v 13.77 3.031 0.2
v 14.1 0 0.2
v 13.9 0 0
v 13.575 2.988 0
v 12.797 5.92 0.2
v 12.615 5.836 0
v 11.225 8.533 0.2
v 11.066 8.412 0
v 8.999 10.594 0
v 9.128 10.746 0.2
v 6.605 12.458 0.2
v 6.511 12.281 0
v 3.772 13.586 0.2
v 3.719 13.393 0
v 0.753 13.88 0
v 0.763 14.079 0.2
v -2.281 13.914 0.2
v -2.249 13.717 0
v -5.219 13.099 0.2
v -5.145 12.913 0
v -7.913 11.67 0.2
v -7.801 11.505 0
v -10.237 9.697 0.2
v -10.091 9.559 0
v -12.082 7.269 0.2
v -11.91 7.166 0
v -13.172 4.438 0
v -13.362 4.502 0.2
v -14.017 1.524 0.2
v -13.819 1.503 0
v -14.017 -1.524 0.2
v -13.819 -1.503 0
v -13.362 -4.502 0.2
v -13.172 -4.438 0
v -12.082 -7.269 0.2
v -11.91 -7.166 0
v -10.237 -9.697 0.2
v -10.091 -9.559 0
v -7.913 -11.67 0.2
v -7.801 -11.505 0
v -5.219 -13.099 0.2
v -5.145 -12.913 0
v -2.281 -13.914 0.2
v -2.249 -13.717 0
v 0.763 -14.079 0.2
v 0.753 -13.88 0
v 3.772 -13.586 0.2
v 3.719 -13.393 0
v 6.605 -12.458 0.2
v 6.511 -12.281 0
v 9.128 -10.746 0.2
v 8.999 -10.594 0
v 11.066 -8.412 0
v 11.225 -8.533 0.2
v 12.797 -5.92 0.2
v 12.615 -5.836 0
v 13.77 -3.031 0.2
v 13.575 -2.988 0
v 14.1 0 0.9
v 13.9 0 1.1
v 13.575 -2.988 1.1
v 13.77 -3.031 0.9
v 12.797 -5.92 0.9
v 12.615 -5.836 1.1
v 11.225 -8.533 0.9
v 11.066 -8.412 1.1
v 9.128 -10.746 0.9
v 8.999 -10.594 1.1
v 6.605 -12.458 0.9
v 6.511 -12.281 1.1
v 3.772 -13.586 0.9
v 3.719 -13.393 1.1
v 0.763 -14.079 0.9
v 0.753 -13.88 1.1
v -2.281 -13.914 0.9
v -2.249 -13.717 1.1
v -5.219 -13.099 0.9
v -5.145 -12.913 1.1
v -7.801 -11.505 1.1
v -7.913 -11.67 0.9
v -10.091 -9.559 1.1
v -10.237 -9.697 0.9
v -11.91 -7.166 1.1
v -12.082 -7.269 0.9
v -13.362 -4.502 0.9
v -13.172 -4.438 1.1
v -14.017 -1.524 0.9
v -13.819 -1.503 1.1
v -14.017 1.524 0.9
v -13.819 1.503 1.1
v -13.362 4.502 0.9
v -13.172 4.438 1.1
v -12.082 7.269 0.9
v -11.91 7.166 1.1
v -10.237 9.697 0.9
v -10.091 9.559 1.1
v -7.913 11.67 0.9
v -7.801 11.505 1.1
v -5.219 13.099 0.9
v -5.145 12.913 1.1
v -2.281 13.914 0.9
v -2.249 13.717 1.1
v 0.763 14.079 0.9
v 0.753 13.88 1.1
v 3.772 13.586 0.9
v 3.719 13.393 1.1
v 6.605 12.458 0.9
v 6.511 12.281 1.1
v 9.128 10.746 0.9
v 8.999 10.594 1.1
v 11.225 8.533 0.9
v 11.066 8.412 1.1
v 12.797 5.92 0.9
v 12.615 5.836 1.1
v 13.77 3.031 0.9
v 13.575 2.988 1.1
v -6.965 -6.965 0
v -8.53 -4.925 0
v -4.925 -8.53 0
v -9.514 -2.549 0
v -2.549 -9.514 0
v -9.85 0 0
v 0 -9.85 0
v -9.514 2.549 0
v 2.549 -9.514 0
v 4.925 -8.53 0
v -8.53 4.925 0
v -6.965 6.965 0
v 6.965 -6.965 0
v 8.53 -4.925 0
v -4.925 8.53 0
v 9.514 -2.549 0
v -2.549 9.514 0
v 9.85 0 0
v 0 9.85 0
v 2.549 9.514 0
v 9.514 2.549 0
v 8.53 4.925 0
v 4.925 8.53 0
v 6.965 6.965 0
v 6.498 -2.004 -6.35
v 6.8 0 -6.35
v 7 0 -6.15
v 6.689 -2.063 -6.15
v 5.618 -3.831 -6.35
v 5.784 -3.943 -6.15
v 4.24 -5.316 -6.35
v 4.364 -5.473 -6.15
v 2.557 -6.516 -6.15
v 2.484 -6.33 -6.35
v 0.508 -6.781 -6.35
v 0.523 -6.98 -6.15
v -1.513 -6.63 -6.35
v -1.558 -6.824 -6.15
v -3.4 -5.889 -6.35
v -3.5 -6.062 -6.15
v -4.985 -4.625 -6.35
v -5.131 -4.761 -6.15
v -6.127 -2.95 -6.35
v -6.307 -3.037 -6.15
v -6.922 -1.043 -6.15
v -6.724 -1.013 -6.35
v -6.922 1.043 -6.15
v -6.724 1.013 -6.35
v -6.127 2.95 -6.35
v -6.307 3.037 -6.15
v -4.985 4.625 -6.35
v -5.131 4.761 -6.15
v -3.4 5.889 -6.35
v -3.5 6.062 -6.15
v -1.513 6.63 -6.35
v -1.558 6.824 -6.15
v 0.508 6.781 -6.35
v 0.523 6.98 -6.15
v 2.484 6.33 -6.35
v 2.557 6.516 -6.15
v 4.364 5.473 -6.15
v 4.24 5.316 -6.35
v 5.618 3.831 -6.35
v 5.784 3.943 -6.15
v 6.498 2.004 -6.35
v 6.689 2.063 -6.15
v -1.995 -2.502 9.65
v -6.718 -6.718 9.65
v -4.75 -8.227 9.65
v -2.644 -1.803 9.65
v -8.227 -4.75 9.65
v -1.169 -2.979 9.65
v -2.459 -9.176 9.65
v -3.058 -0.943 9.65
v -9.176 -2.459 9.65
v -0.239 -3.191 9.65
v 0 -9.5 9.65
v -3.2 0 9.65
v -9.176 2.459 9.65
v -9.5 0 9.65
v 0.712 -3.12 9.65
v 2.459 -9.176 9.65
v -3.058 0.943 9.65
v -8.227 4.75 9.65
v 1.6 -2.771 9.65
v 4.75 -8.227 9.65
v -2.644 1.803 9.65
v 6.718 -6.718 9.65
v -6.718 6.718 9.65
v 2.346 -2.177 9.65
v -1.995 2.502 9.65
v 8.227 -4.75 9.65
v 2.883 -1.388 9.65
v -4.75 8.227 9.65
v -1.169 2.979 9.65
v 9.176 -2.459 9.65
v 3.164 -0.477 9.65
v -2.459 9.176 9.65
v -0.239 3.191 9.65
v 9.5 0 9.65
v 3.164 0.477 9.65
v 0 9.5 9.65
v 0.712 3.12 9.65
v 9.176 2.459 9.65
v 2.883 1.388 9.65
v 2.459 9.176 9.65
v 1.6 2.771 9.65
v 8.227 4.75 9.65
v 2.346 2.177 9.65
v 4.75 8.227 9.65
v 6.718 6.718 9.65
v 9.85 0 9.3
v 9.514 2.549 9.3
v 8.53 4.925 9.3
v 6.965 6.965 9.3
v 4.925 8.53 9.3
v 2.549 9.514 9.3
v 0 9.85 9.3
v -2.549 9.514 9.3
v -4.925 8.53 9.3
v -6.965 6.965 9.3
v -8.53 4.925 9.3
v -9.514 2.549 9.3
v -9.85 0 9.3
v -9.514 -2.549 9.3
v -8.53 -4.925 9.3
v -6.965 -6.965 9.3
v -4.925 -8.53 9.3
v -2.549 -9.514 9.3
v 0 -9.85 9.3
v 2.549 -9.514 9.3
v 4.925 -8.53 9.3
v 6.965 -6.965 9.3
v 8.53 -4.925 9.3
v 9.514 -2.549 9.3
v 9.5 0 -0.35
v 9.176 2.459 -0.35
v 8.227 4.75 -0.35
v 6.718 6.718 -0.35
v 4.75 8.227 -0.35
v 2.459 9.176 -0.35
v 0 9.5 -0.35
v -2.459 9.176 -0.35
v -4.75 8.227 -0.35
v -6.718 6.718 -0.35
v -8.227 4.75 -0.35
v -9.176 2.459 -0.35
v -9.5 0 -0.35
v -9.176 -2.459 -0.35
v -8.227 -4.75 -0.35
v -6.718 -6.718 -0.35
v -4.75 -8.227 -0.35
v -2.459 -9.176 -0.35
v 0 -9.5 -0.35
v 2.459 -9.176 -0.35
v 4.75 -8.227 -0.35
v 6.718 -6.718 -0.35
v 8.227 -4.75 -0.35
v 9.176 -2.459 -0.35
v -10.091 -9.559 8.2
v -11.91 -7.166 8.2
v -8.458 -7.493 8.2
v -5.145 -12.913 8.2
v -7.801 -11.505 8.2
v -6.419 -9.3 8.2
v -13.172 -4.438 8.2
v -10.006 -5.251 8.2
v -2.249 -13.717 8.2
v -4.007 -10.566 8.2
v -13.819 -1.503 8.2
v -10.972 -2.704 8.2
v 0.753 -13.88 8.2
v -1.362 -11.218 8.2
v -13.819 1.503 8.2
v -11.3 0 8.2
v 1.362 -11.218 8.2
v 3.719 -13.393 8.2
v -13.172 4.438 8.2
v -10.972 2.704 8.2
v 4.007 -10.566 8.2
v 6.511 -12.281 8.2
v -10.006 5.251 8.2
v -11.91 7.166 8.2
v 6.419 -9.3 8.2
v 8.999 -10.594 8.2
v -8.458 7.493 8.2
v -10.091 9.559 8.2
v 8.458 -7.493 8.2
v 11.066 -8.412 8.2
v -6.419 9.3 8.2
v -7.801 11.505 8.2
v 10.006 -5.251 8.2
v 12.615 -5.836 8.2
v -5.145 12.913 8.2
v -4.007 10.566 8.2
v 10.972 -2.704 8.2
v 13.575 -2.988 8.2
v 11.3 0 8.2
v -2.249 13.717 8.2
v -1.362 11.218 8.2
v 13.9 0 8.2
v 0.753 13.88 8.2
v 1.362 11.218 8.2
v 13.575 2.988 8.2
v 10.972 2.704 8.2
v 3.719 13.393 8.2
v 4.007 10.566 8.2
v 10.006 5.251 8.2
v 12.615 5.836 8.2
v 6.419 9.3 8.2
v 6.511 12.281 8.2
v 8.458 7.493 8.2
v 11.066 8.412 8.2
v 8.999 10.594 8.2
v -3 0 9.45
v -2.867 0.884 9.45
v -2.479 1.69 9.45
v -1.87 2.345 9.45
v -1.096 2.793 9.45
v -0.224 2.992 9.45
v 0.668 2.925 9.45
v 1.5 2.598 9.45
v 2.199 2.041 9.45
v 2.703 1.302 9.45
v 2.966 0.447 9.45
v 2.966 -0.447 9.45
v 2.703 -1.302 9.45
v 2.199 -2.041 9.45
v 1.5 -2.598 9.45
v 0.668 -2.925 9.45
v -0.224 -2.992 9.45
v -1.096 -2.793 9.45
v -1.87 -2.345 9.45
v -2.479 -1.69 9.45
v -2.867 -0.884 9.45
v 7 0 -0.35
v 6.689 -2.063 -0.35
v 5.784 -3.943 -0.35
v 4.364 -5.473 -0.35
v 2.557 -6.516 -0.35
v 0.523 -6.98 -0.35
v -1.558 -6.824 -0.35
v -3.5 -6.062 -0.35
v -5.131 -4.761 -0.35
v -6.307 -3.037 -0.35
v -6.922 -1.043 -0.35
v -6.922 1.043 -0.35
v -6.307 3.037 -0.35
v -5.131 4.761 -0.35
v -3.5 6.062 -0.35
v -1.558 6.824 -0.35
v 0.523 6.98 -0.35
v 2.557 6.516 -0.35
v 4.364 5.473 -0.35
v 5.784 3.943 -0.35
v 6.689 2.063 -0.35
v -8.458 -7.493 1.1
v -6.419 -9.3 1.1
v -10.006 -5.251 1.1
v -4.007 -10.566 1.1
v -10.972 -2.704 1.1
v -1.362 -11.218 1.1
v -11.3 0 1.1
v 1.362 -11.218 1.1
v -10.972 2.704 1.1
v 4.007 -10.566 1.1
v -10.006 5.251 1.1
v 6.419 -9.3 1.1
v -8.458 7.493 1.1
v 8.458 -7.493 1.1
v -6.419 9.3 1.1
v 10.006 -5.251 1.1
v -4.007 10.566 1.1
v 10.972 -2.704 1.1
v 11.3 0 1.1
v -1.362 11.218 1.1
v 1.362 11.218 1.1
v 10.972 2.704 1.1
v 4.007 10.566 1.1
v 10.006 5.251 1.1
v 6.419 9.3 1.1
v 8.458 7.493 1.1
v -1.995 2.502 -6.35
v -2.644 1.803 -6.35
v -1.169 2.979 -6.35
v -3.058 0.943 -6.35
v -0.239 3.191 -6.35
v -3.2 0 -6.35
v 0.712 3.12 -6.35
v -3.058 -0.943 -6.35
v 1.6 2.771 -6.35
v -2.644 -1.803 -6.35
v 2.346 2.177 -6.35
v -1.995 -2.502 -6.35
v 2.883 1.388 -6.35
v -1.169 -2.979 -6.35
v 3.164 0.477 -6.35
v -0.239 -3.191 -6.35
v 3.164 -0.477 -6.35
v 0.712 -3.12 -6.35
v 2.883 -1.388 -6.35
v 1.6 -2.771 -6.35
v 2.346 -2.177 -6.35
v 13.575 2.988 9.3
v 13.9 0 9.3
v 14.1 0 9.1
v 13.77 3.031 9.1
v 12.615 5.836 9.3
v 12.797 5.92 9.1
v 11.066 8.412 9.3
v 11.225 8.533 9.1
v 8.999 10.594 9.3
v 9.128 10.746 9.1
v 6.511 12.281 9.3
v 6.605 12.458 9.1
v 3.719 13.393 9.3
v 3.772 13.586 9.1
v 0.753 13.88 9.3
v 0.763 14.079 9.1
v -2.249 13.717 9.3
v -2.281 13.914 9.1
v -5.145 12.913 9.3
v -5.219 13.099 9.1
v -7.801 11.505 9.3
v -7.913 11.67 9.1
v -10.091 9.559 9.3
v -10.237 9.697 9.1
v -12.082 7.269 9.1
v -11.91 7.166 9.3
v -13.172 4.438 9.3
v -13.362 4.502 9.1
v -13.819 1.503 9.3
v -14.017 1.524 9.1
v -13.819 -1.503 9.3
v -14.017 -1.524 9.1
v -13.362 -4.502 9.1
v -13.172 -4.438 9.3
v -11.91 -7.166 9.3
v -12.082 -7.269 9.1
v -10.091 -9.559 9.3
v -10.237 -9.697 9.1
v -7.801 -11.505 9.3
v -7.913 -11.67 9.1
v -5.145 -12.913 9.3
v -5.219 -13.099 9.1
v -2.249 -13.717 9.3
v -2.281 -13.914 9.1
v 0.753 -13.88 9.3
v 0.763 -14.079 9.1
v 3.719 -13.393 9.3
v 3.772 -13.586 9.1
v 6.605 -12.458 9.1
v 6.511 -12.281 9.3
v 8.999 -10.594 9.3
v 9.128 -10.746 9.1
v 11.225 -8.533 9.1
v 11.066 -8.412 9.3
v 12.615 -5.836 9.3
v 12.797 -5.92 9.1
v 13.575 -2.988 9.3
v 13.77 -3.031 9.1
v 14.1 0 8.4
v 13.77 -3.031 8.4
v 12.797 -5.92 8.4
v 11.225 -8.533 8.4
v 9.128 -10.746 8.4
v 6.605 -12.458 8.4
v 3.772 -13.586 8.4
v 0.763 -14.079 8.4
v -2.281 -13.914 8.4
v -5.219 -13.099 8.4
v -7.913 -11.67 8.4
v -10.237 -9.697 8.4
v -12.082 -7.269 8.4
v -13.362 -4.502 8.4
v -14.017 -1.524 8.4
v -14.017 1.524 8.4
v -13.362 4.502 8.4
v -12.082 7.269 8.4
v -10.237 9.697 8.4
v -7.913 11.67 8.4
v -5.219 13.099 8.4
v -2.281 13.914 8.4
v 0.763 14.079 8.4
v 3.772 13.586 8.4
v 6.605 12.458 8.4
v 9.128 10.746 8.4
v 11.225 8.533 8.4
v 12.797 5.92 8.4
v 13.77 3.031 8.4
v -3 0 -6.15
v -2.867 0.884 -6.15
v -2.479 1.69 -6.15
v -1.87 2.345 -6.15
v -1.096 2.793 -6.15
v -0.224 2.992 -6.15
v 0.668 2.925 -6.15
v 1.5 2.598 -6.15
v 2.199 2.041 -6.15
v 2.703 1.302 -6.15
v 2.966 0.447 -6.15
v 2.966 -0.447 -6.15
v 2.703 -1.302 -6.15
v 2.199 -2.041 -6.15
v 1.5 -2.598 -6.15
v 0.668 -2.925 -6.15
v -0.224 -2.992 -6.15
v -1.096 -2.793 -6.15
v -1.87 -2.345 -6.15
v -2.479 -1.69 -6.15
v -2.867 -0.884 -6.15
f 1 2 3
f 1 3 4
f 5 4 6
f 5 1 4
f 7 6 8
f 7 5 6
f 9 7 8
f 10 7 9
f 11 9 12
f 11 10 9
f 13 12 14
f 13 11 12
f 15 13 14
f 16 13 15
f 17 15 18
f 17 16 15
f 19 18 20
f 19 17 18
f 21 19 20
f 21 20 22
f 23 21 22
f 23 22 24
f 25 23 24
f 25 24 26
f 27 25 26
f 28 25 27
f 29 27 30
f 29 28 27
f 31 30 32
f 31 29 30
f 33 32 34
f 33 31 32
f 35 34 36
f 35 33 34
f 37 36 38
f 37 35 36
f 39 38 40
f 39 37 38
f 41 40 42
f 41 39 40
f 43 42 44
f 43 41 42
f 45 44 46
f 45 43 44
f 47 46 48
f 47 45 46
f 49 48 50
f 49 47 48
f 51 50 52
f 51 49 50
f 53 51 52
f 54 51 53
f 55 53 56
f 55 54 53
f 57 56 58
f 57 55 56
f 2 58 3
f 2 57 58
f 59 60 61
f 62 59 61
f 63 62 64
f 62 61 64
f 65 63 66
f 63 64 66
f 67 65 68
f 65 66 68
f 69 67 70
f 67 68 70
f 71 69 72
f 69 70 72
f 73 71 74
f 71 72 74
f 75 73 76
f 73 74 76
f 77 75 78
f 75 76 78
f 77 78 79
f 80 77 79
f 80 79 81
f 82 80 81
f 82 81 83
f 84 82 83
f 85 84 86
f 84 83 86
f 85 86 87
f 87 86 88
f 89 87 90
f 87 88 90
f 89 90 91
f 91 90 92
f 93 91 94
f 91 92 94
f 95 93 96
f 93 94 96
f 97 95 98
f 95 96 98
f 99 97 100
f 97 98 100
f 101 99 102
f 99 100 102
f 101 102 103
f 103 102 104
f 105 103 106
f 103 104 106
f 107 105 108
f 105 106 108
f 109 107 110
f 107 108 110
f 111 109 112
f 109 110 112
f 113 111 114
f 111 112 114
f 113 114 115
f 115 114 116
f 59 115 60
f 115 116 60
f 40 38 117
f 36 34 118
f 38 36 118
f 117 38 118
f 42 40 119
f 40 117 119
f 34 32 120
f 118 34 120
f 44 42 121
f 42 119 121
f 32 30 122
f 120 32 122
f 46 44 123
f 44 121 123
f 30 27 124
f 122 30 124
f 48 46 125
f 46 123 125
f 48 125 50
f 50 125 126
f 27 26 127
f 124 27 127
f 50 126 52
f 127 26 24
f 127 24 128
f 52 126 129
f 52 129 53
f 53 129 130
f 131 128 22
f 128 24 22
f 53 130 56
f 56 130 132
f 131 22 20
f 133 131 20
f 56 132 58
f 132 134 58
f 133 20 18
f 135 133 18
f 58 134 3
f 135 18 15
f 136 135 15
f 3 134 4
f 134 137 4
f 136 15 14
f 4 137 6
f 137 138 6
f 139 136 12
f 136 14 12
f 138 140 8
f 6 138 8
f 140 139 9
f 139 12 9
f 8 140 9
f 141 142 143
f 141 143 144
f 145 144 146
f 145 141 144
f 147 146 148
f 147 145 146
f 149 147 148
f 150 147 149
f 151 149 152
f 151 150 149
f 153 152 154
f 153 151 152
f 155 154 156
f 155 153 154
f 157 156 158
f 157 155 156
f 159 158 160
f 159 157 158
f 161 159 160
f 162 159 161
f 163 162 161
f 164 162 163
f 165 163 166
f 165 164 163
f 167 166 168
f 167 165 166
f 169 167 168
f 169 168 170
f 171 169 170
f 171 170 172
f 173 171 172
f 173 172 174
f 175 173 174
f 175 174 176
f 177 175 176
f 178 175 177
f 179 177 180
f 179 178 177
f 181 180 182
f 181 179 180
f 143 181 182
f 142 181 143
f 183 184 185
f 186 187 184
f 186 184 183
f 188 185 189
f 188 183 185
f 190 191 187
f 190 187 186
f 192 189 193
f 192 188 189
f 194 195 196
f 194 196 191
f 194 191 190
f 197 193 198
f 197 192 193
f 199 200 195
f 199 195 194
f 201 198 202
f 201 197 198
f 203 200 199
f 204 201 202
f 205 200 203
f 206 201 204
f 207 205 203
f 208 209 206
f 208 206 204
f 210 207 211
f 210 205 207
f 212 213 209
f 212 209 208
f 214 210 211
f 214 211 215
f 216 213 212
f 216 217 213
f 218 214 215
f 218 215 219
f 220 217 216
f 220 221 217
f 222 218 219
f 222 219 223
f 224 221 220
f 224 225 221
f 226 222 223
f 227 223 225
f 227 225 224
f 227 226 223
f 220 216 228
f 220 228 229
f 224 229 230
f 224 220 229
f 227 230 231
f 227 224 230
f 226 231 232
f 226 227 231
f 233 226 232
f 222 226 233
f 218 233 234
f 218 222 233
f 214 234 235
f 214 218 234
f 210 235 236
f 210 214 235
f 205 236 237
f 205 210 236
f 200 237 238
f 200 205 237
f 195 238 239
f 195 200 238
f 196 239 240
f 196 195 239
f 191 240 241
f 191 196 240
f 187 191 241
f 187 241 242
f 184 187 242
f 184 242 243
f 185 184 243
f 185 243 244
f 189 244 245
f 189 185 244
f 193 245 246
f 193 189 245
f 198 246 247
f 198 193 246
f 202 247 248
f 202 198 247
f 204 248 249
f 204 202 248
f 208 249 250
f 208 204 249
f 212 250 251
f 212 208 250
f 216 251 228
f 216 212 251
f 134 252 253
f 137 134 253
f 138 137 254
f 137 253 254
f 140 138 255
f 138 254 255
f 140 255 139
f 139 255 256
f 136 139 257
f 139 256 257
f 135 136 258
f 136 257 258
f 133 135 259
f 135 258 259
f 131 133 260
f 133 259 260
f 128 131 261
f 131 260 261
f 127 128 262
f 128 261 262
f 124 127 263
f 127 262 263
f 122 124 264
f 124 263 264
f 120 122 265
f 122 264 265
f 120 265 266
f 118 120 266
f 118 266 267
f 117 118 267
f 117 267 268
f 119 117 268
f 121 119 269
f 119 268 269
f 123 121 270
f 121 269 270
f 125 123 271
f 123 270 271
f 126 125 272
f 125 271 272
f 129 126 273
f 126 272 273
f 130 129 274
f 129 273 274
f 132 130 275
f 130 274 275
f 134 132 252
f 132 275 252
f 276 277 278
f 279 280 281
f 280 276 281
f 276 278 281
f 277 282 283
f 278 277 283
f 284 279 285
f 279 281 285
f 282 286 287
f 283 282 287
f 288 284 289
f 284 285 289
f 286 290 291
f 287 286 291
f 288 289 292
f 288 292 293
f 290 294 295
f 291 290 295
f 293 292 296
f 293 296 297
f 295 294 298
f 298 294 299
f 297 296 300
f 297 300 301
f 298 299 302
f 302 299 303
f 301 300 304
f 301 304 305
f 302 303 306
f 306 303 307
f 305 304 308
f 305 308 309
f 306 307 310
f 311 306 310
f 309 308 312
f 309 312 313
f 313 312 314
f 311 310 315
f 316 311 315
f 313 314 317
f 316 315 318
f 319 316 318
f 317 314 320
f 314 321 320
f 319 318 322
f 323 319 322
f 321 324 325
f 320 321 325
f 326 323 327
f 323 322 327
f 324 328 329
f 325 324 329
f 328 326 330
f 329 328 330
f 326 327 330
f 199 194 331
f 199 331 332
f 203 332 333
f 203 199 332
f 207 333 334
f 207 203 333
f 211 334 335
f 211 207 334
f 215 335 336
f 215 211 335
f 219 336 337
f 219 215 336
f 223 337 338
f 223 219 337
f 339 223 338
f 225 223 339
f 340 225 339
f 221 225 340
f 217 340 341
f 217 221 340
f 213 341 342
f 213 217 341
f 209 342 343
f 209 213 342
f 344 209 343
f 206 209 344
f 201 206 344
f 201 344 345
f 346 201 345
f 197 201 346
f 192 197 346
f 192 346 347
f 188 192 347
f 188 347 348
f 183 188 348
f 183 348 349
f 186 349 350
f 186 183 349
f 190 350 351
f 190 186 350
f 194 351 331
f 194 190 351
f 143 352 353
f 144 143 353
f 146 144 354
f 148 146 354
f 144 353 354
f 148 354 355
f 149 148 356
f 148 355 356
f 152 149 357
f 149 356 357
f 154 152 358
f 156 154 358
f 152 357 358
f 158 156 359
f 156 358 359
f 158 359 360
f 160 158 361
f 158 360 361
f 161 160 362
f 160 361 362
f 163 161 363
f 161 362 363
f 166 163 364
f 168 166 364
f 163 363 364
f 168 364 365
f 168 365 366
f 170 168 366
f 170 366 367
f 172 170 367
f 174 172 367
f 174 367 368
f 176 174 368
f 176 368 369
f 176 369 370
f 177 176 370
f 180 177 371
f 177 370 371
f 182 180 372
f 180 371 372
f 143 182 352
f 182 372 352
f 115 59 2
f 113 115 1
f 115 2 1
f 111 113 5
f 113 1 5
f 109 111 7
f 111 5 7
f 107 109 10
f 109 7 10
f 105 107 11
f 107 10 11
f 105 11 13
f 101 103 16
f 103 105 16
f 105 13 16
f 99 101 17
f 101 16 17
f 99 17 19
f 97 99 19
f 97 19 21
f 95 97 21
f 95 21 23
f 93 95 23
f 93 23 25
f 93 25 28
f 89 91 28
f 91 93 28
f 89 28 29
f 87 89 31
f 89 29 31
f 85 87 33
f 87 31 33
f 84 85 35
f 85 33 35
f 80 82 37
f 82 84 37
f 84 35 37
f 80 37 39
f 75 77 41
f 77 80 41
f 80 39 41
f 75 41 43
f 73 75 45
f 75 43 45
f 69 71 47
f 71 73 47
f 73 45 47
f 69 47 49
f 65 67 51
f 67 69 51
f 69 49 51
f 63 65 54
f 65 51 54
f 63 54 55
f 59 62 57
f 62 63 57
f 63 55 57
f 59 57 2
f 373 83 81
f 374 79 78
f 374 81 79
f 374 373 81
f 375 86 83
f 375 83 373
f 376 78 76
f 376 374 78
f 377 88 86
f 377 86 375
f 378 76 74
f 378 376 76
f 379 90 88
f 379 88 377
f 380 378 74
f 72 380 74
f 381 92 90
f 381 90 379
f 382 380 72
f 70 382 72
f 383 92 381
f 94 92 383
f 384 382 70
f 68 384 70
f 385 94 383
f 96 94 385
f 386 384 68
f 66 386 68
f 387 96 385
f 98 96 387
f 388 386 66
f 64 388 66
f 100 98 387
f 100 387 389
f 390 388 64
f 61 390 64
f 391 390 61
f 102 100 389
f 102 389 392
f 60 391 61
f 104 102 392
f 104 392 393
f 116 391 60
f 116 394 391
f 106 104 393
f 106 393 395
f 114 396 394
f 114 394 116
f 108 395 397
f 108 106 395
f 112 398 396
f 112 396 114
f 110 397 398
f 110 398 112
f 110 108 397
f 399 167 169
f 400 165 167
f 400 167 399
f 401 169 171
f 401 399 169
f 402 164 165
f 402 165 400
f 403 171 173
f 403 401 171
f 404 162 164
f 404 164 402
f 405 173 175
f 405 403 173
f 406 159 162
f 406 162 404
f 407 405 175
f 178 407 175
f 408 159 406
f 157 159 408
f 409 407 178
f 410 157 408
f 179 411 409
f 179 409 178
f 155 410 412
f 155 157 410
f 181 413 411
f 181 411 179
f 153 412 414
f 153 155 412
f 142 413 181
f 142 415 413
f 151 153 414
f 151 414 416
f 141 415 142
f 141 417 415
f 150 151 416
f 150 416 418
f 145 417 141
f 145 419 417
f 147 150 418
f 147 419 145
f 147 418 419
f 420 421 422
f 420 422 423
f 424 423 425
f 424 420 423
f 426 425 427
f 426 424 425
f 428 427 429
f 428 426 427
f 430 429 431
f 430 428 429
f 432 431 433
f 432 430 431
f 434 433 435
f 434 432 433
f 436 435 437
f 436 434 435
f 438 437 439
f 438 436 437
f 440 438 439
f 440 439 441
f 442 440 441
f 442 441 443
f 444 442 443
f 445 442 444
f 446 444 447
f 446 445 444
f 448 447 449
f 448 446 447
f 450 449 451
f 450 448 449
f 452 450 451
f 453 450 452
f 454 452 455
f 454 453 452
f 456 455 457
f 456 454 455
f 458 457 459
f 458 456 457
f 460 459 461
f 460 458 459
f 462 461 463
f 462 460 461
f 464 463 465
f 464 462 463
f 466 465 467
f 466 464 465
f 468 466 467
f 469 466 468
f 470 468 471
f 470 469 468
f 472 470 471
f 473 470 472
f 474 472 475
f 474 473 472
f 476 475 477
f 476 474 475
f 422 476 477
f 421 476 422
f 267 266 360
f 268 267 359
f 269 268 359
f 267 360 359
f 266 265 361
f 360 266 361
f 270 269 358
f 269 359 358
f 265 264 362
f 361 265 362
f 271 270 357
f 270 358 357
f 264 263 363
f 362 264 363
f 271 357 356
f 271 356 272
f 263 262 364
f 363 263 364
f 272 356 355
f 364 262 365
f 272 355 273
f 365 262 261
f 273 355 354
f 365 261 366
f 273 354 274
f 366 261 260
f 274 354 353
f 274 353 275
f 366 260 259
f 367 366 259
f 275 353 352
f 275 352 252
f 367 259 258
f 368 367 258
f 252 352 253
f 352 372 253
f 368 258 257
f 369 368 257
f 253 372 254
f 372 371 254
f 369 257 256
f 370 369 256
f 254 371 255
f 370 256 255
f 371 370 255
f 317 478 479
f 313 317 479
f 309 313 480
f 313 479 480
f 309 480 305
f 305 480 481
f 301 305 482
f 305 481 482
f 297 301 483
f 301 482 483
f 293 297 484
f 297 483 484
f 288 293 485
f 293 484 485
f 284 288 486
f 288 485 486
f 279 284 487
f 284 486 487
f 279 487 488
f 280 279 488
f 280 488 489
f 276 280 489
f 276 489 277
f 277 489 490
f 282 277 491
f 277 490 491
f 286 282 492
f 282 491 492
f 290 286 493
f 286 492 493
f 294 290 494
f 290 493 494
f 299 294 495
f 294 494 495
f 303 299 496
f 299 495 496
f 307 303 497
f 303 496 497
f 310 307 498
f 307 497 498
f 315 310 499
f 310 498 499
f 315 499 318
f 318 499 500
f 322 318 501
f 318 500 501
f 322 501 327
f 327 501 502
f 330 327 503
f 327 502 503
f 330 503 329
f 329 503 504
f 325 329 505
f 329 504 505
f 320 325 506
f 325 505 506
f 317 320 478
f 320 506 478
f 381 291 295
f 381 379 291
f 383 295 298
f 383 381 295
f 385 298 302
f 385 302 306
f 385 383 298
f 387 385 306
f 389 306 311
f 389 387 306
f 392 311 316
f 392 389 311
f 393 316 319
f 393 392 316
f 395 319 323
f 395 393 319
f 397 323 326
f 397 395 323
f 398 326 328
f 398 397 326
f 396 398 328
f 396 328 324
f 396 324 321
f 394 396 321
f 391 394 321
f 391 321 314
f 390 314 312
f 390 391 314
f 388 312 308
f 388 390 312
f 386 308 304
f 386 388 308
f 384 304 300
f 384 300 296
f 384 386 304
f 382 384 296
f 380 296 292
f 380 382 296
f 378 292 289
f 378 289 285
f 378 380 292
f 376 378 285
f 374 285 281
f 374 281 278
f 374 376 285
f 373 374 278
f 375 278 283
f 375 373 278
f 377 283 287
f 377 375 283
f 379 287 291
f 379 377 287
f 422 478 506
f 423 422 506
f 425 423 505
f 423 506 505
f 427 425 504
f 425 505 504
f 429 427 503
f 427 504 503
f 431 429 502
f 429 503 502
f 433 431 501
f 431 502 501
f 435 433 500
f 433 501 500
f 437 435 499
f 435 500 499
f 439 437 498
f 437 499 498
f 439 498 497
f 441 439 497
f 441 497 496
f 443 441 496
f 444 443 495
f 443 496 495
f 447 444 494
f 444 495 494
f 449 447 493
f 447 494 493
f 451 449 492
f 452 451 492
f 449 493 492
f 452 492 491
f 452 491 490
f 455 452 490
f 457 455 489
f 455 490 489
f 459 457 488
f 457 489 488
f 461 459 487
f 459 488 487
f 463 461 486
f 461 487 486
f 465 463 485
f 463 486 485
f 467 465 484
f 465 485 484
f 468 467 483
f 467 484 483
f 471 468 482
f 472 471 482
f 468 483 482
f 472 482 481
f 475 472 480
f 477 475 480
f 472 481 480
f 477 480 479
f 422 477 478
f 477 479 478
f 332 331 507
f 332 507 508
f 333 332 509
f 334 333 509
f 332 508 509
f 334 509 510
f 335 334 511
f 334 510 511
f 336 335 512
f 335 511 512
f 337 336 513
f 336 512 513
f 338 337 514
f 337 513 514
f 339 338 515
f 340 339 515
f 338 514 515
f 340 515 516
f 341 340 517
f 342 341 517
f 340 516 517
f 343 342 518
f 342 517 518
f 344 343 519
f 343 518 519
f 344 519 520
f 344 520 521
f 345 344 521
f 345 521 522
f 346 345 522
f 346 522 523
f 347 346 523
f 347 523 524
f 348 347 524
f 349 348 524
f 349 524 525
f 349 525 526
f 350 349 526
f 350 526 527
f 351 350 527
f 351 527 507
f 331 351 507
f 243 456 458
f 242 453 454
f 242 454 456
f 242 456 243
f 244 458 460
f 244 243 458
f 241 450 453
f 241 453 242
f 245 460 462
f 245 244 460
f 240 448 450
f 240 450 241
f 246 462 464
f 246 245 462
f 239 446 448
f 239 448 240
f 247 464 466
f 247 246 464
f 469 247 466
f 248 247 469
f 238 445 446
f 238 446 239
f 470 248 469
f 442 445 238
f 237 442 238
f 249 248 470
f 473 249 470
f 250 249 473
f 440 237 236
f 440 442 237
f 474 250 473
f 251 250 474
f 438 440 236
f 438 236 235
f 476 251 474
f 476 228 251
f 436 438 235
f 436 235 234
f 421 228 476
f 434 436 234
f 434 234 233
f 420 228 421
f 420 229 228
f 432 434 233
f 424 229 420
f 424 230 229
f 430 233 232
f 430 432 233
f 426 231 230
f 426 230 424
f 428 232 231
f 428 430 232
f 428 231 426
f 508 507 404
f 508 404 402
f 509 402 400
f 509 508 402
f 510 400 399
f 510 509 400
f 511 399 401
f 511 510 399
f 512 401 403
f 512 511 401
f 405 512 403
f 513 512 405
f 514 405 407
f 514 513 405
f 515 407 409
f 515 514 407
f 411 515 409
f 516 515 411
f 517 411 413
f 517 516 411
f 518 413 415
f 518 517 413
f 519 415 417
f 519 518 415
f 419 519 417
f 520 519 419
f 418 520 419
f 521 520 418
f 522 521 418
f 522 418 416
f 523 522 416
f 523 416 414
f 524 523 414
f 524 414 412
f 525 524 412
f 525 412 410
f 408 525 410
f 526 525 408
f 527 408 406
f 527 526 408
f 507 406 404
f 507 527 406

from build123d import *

# Parameters (mm, degrees)
SKETCH1_R                = 14.1
BOSS_EXTRUDE1_DEPTH      = 9.3
SKETCH2_W                = 7.1
SKETCH2_H                = 2.8
BOSS_EXTRUDE2_DEPTH      = 0.35
BOSS_EXTRUDE2_DEPTH_BACK = 9.65
SKETCH3_R                = 9.85
CHAMFER1_SIZE            = 0.35
SKETCH4_R                = 7
BOSS_EXTRUDE3_DEPTH      = 6
CUT_EXTRUDE1_REACH       = 27.566
SKETCH5_R                = 3
CHAMFER2_SIZE            = 0.2


with BuildPart() as part:
    # Sketch1 → Boss-Extrude1 (new body)
    with BuildSketch(Plane.XY):
        Circle(SKETCH1_R)
    extrude(amount=BOSS_EXTRUDE1_DEPTH)

    # Sketch2 → Cut-Revolve1 (revolve, cut)
    with BuildSketch(Plane(origin=(0, 0, 0), x_dir=(0, 0, -1), z_dir=(1, 0, 0)), mode=Mode.PRIVATE) as cut_revolve1_sk:
        with Locations((-4.65, 12.7)):
            Rectangle(SKETCH2_W, SKETCH2_H)
    revolve(cut_revolve1_sk.sketch.rotate(Axis((0, 0, -195813.923931263), (0, 0, -1)), 270), axis=Axis((0, 0, -195813.923931263), (0, 0, -1)), mode=Mode.SUBTRACT)

    # Sketch3 → Boss-Extrude2 (add, two sides: drawn at the far end of the back side and taken through both)
    with BuildSketch(Plane.XY.offset(9.3).offset(-BOSS_EXTRUDE2_DEPTH_BACK)):
        Circle(SKETCH3_R)
    extrude(amount=BOSS_EXTRUDE2_DEPTH + BOSS_EXTRUDE2_DEPTH_BACK)

    # Chamfer1
    chamfer1_edges = [part.edges().sort_by_distance(p)[0] for p in [
        (-9.85, 0, -0.35),
        (-9.85, 0, 9.65),
    ]]
    chamfer(chamfer1_edges, length=CHAMFER1_SIZE - 0.0001)  # a hair under: the kernel refuses the full size

    # Sketch4 → Boss-Extrude3 (add)
    with BuildSketch(Plane(origin=(0, 0, -0.35), x_dir=(-1, 0, 0), z_dir=(0, 0, -1))):
        with Locations(Location((0, 0, 0), (0, 0, 180))):
            Circle(SKETCH4_R)
    extrude(amount=BOSS_EXTRUDE3_DEPTH)

    # Sketch5 → Cut-Extrude1 (cut, up to next)
    with BuildSketch(Plane(origin=(0, 0, -6.35), x_dir=(-1, 0, 0), z_dir=(0, 0, -1)), mode=Mode.PRIVATE) as cut_extrude1_sk1:
        Circle(SKETCH5_R)
    cut_extrude1_tool1 = extrude(cut_extrude1_sk1.sketch, amount=-CUT_EXTRUDE1_REACH, mode=Mode.PRIVATE) & part.part
    add(cut_extrude1_tool1.solids().sort_by_distance((0, 0, -6.35))[0], mode=Mode.SUBTRACT)

    # Chamfer2
    chamfer2_edges = [part.edges().sort_by_distance(p)[0] for p in [
        (-14.1, 0, 0),
        (-7, 0, -6.35),
        (3, 0, 9.65),
        (3, 0, -6.35),
        (-14.1, 0, 9.3),
        (-14.1, 0, 1.1),
        (-14.1, 0, 8.2),
    ]]
    chamfer(chamfer2_edges, length=CHAMFER2_SIZE)


solid = part.part
